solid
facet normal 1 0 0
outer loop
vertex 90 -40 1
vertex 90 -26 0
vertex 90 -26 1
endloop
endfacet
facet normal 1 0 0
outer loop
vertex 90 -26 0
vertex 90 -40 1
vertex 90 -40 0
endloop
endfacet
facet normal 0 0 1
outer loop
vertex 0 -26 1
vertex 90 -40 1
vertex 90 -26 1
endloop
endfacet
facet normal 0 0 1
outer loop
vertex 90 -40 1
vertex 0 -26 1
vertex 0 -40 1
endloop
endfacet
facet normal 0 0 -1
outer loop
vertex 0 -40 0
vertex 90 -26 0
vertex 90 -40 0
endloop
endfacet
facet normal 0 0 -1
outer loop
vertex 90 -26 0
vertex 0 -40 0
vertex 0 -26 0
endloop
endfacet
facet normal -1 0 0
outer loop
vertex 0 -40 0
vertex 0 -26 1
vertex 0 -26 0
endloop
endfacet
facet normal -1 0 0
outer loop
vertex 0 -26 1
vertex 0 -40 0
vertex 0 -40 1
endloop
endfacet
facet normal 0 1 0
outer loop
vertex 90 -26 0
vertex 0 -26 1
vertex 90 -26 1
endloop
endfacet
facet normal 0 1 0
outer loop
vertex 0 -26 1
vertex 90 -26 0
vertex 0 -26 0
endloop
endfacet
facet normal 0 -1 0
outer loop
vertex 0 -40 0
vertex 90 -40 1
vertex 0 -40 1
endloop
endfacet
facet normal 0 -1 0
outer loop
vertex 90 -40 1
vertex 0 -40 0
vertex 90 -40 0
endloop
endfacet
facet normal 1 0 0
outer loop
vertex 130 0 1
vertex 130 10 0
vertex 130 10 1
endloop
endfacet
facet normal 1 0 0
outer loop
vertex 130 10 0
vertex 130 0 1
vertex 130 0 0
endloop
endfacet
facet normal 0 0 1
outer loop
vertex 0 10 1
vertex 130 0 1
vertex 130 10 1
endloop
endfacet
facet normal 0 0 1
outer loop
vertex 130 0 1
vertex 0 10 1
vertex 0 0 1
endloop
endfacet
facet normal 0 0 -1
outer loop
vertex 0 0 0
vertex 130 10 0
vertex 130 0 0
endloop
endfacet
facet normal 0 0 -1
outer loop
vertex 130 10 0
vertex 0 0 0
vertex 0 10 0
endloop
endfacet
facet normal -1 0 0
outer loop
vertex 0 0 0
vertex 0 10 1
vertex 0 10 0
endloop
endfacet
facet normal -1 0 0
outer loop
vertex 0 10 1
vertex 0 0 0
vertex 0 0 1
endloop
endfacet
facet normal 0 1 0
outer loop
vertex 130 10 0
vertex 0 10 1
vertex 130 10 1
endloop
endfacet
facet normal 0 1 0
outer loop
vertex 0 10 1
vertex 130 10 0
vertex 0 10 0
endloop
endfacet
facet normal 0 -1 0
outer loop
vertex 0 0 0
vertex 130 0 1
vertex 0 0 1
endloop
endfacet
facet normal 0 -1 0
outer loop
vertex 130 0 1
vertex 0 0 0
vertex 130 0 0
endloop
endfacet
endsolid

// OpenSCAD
// Text Examples
// By Torsten Paul (t-paul)
// CC-BY-SA license



$fn = 20;
$ff = "DejaVuSansCondensed";
$ff2 = "Amiri-Regular";
 
union() {
#cube([130, 10, 1]);
linear_extrude(height = 2)
text(t = "OpenSCAD with Text!", size = 10, $fn = 40, font = $ff);
}
 
translate([0, -40, 0]) difference() {
cube([90, 14, 1]);
translate([5, 3, -1])
linear_extrude(height = 40)
text(t = "FreeType", size = 10, font = $ff);
}
 
translate([0, -20, 0])
linear_extrude(height = 6)
text(t = "it works !!!", font = $ff, size = 17);

//Iterate across individual letters (chars) 
s = "OpenSCAD";
translate([45, 60, 5])
rotate([-30, 0, 0])
for (a = [0 : (len(s)-1)])
rotate([0, 0, 135 + 90 / 7 * a])
translate([0, 70, 0])
rotate([90, 0, 180])
translate([-5, 0, 0])
linear_extrude(height = 2)
text(t = s[a], size = 20, font = $ff);

//Iterate across individual letters (unicode) 
s_u = "もしもし";
translate([175, 60, -10])
rotate([-30, 0, 0])
for (a = [0 : (len(s_u)-1)])
rotate([0, 0, 135 + 90 / 7 * a])
translate([0, 70, 0])
rotate([90, 0, 180])
translate([-5, 0, 0])
linear_extrude(height = 2)
text(t = s_u[a], size = 15, font = "HanaMinA");
 
translate([0, -80, 0])
rotate([90, 0, 0])
linear_extrude(height = 2)
text(t = "Ленивый рыжий кот", size = 16, font = "DejaVuSansCondensed");
 
translate([0, -120, 0])
rotate([90, 0, 0])
linear_extrude(height = 2)
text(t = "كسول الزنجبيل القط", size = 16, font = $ff2, direction = "rtl", language = "ar", script = "arabic");
 
translate([-20, 0, 0])
linear_extrude(height = 2)
text(t = "懶惰的姜貓", size = 16, font = "AR-PL-New-Sung", direction = "ttb", language = "ch");
 
translate([0, -60, 0])
linear_extrude(height = 2)
text(t = "Umlauts: äöü ÄÖÜ ß", size = 10, font = $ff);
 
translate([0, -80, 0])
linear_extrude(height = 2)
text(t = "Smileys: 😁😂😃😄😅😆😇😈😉😊😋😌😍😎😏😐", size = 10, font = $ff);
 
translate([0, -100, 0])
linear_extrude(height = 2)
text(t = "Braile: ⠁⠂⠃⠄⠅⠆⠇⠈⠉⠊⠋⠌⠍⠎⠏", size = 10, font = $ff);
 
translate([0, -120, 0])
linear_extrude(height = 2)
text(t = "Cards: 🂡🂱🃁🃑", size = 10, font = $ff);
